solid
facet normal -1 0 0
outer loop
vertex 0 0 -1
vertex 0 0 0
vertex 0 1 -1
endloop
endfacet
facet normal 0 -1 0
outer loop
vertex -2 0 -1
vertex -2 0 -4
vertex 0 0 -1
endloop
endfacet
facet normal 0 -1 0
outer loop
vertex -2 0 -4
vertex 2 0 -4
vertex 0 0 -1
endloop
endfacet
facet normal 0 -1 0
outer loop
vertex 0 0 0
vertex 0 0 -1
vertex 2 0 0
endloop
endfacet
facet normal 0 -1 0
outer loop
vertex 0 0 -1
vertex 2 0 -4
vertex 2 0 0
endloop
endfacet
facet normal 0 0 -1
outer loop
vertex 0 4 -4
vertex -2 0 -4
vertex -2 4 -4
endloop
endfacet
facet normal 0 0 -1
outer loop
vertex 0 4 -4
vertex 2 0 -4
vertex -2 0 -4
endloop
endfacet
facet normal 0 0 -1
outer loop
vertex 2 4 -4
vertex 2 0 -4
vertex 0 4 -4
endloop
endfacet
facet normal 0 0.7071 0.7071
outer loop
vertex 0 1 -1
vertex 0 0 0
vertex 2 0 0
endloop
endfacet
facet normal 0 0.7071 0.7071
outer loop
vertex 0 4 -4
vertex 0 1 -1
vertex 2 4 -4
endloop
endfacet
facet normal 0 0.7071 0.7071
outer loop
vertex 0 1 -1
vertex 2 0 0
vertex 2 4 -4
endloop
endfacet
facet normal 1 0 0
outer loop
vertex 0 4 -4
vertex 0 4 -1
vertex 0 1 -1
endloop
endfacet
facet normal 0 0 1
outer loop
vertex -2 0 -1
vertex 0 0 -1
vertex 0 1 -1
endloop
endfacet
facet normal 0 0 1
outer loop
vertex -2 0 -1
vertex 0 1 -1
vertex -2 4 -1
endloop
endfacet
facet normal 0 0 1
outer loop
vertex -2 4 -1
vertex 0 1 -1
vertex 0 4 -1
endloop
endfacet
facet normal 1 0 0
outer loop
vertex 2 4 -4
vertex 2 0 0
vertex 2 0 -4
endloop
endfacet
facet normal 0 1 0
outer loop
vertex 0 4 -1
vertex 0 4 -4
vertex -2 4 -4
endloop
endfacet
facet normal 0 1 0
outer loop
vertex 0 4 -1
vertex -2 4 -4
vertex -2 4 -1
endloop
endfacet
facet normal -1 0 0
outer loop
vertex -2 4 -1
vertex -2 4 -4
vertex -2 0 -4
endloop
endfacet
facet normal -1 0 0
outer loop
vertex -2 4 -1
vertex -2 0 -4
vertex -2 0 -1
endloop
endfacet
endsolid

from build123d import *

# Parameters (mm, degrees)
SKETCH1_W           = 4
SKETCH1_H           = 4
BOSS_EXTRUDE1_DEPTH = 2
SKETCH2_W           = 3
SKETCH2_H           = 4
BOSS_EXTRUDE2_DEPTH = 2
CUT_EXTRUDE1_DEPTH  = 2


with BuildPart() as part:
    # Sketch1 → Boss-Extrude1 (new body)
    with BuildSketch(Plane(origin=(0, 0, 0), x_dir=(0, 0, -1), z_dir=(1, 0, 0))):
        with Locations((2, 2)):
            Rectangle(SKETCH1_W, SKETCH1_H)
    extrude(amount=BOSS_EXTRUDE1_DEPTH)

    # Sketch2 → Boss-Extrude2 (add)
    with BuildSketch(Plane.ZY):
        with Locations((-2.5, 2)):
            Rectangle(SKETCH2_W, SKETCH2_H)
    extrude(amount=BOSS_EXTRUDE2_DEPTH)

    # Sketch3 → Cut-Extrude1 (cut)
    with BuildSketch(Plane(origin=(2, 0, 0), x_dir=(0, 0, -1), z_dir=(1, 0, 0))):
        Polygon((0, 0), (4, 4), (0, 4), align=None)
    extrude(amount=-CUT_EXTRUDE1_DEPTH, mode=Mode.SUBTRACT)


solid = part.part
